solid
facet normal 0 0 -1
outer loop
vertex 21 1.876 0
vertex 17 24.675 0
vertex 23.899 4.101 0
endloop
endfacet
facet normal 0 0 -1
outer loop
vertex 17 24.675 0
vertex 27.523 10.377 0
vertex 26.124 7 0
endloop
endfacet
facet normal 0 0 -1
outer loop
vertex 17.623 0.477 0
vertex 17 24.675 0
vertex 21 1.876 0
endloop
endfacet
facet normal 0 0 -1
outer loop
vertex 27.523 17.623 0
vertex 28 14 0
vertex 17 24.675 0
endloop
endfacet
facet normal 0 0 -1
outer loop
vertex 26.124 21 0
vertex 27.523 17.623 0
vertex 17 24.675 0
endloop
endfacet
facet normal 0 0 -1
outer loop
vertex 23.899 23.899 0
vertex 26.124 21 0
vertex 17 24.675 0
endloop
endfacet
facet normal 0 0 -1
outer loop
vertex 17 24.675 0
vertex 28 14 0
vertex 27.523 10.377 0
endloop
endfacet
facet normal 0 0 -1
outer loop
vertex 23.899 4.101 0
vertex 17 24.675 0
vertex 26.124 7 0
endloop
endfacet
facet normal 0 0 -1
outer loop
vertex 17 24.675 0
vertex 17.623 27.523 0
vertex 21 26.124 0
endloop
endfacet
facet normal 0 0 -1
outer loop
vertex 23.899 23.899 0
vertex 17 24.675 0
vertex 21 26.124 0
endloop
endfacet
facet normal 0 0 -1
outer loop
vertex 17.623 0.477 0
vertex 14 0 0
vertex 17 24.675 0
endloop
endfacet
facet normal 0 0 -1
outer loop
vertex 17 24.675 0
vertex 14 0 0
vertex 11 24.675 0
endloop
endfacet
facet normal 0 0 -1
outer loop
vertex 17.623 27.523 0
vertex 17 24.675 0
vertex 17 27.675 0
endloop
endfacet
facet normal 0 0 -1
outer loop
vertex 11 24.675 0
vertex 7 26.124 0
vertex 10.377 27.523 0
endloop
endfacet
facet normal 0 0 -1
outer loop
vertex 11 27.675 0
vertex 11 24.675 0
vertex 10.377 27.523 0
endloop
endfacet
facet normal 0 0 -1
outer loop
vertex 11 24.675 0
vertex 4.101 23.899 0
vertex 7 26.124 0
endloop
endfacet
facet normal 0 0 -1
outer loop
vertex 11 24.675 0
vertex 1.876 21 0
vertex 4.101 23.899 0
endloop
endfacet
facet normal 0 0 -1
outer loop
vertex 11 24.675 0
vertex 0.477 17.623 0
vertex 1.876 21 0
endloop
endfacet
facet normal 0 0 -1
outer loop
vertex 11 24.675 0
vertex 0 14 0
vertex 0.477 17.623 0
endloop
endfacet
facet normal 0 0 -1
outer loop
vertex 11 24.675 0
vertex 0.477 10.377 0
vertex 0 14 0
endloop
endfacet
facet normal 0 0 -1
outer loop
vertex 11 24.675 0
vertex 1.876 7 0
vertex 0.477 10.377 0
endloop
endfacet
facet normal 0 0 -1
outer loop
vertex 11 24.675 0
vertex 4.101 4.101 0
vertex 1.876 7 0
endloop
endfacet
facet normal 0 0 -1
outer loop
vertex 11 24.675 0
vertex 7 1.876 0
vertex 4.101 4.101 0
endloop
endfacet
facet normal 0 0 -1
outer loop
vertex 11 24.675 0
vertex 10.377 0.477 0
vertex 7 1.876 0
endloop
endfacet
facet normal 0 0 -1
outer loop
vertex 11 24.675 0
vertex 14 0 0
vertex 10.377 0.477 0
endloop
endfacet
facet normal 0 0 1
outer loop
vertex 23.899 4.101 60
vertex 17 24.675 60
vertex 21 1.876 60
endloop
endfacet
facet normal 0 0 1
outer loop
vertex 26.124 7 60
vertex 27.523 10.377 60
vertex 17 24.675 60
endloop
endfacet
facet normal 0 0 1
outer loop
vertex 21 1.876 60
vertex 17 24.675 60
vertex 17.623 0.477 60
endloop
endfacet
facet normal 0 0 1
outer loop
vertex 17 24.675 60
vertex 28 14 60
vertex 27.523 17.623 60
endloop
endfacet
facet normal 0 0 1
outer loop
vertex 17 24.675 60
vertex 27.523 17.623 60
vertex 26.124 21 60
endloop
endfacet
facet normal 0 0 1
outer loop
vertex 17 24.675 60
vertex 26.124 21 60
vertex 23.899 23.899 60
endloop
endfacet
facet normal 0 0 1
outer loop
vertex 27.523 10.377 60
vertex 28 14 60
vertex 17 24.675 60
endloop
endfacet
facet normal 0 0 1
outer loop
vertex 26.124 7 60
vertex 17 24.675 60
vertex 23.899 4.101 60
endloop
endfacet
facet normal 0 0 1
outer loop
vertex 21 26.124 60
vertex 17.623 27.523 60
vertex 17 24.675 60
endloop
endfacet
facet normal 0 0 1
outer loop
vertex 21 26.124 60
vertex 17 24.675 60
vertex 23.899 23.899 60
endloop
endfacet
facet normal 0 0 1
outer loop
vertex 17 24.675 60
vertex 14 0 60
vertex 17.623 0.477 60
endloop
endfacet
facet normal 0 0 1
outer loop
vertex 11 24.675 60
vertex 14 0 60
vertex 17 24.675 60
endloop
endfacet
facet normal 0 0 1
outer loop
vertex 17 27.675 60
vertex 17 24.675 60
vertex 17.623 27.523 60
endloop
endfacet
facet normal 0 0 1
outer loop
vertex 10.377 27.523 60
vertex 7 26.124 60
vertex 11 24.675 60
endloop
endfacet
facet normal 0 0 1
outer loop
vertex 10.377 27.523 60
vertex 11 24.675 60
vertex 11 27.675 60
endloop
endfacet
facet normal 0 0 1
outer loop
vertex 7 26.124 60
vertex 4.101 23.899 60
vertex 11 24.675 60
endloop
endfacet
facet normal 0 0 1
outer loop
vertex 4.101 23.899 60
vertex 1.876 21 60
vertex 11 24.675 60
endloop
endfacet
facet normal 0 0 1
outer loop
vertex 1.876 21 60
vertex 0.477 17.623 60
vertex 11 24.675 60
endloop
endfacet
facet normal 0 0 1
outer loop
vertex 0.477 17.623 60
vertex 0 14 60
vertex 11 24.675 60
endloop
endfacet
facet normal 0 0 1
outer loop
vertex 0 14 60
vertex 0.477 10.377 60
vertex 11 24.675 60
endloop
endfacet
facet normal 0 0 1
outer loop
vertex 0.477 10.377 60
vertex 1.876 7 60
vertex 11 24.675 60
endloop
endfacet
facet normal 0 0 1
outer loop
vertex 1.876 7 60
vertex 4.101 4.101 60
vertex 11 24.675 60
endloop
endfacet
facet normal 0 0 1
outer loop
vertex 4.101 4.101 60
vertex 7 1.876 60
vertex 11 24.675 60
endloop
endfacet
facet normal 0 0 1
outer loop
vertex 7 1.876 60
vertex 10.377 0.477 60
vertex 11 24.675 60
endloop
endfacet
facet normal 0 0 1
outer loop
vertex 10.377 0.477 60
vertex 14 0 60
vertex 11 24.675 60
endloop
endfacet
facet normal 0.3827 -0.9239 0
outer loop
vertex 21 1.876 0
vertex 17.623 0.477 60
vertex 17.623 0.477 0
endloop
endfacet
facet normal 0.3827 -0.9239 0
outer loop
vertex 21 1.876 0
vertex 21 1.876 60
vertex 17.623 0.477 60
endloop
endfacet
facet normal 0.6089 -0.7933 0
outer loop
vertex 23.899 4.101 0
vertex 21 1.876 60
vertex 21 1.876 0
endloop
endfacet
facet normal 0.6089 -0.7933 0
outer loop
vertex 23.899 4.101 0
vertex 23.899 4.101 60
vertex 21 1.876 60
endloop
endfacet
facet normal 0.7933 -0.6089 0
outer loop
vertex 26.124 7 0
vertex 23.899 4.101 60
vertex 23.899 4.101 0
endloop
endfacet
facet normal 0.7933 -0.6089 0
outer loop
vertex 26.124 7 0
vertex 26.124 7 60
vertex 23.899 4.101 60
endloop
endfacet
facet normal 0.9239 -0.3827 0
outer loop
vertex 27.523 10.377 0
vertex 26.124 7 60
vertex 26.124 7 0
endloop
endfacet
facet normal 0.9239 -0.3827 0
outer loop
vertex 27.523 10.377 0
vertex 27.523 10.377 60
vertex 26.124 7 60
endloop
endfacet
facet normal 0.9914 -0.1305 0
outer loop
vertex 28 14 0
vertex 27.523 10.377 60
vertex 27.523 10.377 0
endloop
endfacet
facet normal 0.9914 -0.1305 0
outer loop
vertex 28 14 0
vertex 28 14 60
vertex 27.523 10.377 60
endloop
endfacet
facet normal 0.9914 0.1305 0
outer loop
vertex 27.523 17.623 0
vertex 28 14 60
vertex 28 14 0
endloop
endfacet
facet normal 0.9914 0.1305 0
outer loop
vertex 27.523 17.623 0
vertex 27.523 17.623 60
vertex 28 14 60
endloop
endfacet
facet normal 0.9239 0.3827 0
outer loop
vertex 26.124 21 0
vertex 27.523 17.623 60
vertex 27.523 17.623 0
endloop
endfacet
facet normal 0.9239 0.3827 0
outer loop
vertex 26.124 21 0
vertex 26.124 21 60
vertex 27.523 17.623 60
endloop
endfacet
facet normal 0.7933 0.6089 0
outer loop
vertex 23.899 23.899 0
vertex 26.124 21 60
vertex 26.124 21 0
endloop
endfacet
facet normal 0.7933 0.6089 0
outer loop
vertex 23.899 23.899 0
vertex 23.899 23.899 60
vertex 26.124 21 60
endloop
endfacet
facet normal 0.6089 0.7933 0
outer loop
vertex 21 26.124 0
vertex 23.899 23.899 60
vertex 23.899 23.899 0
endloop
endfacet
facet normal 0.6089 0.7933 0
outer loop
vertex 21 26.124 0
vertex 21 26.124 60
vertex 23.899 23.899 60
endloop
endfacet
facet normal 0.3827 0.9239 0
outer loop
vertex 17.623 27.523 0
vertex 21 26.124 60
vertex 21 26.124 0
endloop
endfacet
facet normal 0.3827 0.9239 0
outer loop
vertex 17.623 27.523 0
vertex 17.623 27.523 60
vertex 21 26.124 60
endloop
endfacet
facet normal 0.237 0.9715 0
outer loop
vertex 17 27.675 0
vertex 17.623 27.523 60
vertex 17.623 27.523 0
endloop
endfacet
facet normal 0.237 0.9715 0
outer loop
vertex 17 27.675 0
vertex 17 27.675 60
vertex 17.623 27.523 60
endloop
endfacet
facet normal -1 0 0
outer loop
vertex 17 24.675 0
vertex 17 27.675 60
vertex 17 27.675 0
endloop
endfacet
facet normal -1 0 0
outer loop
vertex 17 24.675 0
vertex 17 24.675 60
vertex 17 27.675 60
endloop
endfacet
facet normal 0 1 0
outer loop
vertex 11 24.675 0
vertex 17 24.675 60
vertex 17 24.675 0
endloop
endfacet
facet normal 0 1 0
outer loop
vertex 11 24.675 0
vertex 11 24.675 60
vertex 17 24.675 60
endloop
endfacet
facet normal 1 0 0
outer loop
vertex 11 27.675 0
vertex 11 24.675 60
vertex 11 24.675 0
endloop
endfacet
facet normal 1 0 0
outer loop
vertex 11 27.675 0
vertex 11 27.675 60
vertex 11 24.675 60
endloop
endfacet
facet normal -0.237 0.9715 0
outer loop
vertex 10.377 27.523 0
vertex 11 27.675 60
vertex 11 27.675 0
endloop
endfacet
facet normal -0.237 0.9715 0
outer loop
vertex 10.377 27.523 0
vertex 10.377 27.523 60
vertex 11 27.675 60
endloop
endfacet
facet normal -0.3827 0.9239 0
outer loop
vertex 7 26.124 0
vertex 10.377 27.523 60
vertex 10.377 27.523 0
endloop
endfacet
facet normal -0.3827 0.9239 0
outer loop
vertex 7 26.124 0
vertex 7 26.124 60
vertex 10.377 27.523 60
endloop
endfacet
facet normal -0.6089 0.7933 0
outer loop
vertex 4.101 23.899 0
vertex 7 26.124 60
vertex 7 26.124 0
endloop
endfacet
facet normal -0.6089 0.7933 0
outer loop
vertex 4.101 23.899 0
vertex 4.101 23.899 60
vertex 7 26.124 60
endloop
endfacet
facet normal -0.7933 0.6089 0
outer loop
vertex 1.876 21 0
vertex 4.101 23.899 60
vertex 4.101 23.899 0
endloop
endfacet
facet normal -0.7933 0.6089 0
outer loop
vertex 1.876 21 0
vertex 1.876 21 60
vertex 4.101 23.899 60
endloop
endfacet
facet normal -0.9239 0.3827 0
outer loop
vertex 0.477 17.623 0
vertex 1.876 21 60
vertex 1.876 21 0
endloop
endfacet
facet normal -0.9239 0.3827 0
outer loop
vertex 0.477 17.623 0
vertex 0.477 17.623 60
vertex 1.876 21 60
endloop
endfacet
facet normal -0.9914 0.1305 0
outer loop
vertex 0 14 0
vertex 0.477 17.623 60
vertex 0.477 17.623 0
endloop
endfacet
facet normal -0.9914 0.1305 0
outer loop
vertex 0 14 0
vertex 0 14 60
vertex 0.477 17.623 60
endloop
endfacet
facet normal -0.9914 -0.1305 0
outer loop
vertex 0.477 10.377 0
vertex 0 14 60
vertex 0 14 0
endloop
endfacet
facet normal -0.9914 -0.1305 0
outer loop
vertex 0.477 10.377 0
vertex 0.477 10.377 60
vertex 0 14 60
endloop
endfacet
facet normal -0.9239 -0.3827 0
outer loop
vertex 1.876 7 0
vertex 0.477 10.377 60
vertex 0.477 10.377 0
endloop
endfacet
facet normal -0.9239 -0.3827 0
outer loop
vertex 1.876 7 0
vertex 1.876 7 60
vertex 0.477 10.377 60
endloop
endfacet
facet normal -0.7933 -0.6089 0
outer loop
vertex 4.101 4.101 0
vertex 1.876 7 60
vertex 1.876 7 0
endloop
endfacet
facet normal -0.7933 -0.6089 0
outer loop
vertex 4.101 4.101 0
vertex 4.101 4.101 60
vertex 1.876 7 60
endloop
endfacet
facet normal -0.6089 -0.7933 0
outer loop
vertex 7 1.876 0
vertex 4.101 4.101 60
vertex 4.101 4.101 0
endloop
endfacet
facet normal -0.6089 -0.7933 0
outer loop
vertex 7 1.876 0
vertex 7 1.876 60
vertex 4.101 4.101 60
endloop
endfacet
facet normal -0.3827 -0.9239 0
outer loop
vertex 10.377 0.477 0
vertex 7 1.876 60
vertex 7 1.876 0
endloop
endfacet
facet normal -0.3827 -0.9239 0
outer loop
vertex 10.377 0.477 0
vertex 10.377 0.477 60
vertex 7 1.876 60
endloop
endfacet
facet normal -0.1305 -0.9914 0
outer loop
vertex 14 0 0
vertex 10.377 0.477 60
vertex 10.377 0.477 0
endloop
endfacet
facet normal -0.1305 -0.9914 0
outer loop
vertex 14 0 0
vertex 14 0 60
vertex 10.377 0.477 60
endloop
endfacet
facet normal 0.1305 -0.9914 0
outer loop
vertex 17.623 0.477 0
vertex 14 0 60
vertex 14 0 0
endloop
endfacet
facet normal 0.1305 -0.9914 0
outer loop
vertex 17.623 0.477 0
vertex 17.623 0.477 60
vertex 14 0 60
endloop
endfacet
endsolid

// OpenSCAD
$fn = 32;

// ----------------------------------------------------------------------
// Keyway shaft: d28 shaft, key 6 x 3 mm
// ----------------------------------------------------------------------

// --- parameters (mm) ---
shaft_r = 14;             // shaft radius
key_w = 6;                // keyway width
key_d = 3;                // keyway depth below the surface line
plate_t = 60;             // shaft length, Z (extrusion height)
fit_tol = 0.02;           // declared fit tolerance (prompt contract)
free_tol = 0.2;           // declared free tolerance (prompt contract)

shaft_d = 2 * shaft_r;  // shaft diameter
circle_step = 15;  // polygon sampling step, degrees

profile = [[10.377, 27.523], [7, 26.124], [4.101, 23.899], [1.876, 21], [0.477, 17.623], [0, 14], [0.477, 10.377], [1.876, 7], [4.101, 4.101], [7, 1.876], [10.377, 0.477], [14, 0], [17.623, 0.477], [21, 1.876], [23.899, 4.101], [26.124, 7], [27.523, 10.377], [28, 14], [27.523, 17.623], [26.124, 21], [23.899, 23.899], [21, 26.124], [17.623, 27.523], [17, 27.675], [17, 24.675], [11, 24.675], [11, 27.675]];  // primary outline, 27 points, counter clockwise

// --- the one profile operation ---
linear_extrude(height = plate_t) polygon(points = profile);
